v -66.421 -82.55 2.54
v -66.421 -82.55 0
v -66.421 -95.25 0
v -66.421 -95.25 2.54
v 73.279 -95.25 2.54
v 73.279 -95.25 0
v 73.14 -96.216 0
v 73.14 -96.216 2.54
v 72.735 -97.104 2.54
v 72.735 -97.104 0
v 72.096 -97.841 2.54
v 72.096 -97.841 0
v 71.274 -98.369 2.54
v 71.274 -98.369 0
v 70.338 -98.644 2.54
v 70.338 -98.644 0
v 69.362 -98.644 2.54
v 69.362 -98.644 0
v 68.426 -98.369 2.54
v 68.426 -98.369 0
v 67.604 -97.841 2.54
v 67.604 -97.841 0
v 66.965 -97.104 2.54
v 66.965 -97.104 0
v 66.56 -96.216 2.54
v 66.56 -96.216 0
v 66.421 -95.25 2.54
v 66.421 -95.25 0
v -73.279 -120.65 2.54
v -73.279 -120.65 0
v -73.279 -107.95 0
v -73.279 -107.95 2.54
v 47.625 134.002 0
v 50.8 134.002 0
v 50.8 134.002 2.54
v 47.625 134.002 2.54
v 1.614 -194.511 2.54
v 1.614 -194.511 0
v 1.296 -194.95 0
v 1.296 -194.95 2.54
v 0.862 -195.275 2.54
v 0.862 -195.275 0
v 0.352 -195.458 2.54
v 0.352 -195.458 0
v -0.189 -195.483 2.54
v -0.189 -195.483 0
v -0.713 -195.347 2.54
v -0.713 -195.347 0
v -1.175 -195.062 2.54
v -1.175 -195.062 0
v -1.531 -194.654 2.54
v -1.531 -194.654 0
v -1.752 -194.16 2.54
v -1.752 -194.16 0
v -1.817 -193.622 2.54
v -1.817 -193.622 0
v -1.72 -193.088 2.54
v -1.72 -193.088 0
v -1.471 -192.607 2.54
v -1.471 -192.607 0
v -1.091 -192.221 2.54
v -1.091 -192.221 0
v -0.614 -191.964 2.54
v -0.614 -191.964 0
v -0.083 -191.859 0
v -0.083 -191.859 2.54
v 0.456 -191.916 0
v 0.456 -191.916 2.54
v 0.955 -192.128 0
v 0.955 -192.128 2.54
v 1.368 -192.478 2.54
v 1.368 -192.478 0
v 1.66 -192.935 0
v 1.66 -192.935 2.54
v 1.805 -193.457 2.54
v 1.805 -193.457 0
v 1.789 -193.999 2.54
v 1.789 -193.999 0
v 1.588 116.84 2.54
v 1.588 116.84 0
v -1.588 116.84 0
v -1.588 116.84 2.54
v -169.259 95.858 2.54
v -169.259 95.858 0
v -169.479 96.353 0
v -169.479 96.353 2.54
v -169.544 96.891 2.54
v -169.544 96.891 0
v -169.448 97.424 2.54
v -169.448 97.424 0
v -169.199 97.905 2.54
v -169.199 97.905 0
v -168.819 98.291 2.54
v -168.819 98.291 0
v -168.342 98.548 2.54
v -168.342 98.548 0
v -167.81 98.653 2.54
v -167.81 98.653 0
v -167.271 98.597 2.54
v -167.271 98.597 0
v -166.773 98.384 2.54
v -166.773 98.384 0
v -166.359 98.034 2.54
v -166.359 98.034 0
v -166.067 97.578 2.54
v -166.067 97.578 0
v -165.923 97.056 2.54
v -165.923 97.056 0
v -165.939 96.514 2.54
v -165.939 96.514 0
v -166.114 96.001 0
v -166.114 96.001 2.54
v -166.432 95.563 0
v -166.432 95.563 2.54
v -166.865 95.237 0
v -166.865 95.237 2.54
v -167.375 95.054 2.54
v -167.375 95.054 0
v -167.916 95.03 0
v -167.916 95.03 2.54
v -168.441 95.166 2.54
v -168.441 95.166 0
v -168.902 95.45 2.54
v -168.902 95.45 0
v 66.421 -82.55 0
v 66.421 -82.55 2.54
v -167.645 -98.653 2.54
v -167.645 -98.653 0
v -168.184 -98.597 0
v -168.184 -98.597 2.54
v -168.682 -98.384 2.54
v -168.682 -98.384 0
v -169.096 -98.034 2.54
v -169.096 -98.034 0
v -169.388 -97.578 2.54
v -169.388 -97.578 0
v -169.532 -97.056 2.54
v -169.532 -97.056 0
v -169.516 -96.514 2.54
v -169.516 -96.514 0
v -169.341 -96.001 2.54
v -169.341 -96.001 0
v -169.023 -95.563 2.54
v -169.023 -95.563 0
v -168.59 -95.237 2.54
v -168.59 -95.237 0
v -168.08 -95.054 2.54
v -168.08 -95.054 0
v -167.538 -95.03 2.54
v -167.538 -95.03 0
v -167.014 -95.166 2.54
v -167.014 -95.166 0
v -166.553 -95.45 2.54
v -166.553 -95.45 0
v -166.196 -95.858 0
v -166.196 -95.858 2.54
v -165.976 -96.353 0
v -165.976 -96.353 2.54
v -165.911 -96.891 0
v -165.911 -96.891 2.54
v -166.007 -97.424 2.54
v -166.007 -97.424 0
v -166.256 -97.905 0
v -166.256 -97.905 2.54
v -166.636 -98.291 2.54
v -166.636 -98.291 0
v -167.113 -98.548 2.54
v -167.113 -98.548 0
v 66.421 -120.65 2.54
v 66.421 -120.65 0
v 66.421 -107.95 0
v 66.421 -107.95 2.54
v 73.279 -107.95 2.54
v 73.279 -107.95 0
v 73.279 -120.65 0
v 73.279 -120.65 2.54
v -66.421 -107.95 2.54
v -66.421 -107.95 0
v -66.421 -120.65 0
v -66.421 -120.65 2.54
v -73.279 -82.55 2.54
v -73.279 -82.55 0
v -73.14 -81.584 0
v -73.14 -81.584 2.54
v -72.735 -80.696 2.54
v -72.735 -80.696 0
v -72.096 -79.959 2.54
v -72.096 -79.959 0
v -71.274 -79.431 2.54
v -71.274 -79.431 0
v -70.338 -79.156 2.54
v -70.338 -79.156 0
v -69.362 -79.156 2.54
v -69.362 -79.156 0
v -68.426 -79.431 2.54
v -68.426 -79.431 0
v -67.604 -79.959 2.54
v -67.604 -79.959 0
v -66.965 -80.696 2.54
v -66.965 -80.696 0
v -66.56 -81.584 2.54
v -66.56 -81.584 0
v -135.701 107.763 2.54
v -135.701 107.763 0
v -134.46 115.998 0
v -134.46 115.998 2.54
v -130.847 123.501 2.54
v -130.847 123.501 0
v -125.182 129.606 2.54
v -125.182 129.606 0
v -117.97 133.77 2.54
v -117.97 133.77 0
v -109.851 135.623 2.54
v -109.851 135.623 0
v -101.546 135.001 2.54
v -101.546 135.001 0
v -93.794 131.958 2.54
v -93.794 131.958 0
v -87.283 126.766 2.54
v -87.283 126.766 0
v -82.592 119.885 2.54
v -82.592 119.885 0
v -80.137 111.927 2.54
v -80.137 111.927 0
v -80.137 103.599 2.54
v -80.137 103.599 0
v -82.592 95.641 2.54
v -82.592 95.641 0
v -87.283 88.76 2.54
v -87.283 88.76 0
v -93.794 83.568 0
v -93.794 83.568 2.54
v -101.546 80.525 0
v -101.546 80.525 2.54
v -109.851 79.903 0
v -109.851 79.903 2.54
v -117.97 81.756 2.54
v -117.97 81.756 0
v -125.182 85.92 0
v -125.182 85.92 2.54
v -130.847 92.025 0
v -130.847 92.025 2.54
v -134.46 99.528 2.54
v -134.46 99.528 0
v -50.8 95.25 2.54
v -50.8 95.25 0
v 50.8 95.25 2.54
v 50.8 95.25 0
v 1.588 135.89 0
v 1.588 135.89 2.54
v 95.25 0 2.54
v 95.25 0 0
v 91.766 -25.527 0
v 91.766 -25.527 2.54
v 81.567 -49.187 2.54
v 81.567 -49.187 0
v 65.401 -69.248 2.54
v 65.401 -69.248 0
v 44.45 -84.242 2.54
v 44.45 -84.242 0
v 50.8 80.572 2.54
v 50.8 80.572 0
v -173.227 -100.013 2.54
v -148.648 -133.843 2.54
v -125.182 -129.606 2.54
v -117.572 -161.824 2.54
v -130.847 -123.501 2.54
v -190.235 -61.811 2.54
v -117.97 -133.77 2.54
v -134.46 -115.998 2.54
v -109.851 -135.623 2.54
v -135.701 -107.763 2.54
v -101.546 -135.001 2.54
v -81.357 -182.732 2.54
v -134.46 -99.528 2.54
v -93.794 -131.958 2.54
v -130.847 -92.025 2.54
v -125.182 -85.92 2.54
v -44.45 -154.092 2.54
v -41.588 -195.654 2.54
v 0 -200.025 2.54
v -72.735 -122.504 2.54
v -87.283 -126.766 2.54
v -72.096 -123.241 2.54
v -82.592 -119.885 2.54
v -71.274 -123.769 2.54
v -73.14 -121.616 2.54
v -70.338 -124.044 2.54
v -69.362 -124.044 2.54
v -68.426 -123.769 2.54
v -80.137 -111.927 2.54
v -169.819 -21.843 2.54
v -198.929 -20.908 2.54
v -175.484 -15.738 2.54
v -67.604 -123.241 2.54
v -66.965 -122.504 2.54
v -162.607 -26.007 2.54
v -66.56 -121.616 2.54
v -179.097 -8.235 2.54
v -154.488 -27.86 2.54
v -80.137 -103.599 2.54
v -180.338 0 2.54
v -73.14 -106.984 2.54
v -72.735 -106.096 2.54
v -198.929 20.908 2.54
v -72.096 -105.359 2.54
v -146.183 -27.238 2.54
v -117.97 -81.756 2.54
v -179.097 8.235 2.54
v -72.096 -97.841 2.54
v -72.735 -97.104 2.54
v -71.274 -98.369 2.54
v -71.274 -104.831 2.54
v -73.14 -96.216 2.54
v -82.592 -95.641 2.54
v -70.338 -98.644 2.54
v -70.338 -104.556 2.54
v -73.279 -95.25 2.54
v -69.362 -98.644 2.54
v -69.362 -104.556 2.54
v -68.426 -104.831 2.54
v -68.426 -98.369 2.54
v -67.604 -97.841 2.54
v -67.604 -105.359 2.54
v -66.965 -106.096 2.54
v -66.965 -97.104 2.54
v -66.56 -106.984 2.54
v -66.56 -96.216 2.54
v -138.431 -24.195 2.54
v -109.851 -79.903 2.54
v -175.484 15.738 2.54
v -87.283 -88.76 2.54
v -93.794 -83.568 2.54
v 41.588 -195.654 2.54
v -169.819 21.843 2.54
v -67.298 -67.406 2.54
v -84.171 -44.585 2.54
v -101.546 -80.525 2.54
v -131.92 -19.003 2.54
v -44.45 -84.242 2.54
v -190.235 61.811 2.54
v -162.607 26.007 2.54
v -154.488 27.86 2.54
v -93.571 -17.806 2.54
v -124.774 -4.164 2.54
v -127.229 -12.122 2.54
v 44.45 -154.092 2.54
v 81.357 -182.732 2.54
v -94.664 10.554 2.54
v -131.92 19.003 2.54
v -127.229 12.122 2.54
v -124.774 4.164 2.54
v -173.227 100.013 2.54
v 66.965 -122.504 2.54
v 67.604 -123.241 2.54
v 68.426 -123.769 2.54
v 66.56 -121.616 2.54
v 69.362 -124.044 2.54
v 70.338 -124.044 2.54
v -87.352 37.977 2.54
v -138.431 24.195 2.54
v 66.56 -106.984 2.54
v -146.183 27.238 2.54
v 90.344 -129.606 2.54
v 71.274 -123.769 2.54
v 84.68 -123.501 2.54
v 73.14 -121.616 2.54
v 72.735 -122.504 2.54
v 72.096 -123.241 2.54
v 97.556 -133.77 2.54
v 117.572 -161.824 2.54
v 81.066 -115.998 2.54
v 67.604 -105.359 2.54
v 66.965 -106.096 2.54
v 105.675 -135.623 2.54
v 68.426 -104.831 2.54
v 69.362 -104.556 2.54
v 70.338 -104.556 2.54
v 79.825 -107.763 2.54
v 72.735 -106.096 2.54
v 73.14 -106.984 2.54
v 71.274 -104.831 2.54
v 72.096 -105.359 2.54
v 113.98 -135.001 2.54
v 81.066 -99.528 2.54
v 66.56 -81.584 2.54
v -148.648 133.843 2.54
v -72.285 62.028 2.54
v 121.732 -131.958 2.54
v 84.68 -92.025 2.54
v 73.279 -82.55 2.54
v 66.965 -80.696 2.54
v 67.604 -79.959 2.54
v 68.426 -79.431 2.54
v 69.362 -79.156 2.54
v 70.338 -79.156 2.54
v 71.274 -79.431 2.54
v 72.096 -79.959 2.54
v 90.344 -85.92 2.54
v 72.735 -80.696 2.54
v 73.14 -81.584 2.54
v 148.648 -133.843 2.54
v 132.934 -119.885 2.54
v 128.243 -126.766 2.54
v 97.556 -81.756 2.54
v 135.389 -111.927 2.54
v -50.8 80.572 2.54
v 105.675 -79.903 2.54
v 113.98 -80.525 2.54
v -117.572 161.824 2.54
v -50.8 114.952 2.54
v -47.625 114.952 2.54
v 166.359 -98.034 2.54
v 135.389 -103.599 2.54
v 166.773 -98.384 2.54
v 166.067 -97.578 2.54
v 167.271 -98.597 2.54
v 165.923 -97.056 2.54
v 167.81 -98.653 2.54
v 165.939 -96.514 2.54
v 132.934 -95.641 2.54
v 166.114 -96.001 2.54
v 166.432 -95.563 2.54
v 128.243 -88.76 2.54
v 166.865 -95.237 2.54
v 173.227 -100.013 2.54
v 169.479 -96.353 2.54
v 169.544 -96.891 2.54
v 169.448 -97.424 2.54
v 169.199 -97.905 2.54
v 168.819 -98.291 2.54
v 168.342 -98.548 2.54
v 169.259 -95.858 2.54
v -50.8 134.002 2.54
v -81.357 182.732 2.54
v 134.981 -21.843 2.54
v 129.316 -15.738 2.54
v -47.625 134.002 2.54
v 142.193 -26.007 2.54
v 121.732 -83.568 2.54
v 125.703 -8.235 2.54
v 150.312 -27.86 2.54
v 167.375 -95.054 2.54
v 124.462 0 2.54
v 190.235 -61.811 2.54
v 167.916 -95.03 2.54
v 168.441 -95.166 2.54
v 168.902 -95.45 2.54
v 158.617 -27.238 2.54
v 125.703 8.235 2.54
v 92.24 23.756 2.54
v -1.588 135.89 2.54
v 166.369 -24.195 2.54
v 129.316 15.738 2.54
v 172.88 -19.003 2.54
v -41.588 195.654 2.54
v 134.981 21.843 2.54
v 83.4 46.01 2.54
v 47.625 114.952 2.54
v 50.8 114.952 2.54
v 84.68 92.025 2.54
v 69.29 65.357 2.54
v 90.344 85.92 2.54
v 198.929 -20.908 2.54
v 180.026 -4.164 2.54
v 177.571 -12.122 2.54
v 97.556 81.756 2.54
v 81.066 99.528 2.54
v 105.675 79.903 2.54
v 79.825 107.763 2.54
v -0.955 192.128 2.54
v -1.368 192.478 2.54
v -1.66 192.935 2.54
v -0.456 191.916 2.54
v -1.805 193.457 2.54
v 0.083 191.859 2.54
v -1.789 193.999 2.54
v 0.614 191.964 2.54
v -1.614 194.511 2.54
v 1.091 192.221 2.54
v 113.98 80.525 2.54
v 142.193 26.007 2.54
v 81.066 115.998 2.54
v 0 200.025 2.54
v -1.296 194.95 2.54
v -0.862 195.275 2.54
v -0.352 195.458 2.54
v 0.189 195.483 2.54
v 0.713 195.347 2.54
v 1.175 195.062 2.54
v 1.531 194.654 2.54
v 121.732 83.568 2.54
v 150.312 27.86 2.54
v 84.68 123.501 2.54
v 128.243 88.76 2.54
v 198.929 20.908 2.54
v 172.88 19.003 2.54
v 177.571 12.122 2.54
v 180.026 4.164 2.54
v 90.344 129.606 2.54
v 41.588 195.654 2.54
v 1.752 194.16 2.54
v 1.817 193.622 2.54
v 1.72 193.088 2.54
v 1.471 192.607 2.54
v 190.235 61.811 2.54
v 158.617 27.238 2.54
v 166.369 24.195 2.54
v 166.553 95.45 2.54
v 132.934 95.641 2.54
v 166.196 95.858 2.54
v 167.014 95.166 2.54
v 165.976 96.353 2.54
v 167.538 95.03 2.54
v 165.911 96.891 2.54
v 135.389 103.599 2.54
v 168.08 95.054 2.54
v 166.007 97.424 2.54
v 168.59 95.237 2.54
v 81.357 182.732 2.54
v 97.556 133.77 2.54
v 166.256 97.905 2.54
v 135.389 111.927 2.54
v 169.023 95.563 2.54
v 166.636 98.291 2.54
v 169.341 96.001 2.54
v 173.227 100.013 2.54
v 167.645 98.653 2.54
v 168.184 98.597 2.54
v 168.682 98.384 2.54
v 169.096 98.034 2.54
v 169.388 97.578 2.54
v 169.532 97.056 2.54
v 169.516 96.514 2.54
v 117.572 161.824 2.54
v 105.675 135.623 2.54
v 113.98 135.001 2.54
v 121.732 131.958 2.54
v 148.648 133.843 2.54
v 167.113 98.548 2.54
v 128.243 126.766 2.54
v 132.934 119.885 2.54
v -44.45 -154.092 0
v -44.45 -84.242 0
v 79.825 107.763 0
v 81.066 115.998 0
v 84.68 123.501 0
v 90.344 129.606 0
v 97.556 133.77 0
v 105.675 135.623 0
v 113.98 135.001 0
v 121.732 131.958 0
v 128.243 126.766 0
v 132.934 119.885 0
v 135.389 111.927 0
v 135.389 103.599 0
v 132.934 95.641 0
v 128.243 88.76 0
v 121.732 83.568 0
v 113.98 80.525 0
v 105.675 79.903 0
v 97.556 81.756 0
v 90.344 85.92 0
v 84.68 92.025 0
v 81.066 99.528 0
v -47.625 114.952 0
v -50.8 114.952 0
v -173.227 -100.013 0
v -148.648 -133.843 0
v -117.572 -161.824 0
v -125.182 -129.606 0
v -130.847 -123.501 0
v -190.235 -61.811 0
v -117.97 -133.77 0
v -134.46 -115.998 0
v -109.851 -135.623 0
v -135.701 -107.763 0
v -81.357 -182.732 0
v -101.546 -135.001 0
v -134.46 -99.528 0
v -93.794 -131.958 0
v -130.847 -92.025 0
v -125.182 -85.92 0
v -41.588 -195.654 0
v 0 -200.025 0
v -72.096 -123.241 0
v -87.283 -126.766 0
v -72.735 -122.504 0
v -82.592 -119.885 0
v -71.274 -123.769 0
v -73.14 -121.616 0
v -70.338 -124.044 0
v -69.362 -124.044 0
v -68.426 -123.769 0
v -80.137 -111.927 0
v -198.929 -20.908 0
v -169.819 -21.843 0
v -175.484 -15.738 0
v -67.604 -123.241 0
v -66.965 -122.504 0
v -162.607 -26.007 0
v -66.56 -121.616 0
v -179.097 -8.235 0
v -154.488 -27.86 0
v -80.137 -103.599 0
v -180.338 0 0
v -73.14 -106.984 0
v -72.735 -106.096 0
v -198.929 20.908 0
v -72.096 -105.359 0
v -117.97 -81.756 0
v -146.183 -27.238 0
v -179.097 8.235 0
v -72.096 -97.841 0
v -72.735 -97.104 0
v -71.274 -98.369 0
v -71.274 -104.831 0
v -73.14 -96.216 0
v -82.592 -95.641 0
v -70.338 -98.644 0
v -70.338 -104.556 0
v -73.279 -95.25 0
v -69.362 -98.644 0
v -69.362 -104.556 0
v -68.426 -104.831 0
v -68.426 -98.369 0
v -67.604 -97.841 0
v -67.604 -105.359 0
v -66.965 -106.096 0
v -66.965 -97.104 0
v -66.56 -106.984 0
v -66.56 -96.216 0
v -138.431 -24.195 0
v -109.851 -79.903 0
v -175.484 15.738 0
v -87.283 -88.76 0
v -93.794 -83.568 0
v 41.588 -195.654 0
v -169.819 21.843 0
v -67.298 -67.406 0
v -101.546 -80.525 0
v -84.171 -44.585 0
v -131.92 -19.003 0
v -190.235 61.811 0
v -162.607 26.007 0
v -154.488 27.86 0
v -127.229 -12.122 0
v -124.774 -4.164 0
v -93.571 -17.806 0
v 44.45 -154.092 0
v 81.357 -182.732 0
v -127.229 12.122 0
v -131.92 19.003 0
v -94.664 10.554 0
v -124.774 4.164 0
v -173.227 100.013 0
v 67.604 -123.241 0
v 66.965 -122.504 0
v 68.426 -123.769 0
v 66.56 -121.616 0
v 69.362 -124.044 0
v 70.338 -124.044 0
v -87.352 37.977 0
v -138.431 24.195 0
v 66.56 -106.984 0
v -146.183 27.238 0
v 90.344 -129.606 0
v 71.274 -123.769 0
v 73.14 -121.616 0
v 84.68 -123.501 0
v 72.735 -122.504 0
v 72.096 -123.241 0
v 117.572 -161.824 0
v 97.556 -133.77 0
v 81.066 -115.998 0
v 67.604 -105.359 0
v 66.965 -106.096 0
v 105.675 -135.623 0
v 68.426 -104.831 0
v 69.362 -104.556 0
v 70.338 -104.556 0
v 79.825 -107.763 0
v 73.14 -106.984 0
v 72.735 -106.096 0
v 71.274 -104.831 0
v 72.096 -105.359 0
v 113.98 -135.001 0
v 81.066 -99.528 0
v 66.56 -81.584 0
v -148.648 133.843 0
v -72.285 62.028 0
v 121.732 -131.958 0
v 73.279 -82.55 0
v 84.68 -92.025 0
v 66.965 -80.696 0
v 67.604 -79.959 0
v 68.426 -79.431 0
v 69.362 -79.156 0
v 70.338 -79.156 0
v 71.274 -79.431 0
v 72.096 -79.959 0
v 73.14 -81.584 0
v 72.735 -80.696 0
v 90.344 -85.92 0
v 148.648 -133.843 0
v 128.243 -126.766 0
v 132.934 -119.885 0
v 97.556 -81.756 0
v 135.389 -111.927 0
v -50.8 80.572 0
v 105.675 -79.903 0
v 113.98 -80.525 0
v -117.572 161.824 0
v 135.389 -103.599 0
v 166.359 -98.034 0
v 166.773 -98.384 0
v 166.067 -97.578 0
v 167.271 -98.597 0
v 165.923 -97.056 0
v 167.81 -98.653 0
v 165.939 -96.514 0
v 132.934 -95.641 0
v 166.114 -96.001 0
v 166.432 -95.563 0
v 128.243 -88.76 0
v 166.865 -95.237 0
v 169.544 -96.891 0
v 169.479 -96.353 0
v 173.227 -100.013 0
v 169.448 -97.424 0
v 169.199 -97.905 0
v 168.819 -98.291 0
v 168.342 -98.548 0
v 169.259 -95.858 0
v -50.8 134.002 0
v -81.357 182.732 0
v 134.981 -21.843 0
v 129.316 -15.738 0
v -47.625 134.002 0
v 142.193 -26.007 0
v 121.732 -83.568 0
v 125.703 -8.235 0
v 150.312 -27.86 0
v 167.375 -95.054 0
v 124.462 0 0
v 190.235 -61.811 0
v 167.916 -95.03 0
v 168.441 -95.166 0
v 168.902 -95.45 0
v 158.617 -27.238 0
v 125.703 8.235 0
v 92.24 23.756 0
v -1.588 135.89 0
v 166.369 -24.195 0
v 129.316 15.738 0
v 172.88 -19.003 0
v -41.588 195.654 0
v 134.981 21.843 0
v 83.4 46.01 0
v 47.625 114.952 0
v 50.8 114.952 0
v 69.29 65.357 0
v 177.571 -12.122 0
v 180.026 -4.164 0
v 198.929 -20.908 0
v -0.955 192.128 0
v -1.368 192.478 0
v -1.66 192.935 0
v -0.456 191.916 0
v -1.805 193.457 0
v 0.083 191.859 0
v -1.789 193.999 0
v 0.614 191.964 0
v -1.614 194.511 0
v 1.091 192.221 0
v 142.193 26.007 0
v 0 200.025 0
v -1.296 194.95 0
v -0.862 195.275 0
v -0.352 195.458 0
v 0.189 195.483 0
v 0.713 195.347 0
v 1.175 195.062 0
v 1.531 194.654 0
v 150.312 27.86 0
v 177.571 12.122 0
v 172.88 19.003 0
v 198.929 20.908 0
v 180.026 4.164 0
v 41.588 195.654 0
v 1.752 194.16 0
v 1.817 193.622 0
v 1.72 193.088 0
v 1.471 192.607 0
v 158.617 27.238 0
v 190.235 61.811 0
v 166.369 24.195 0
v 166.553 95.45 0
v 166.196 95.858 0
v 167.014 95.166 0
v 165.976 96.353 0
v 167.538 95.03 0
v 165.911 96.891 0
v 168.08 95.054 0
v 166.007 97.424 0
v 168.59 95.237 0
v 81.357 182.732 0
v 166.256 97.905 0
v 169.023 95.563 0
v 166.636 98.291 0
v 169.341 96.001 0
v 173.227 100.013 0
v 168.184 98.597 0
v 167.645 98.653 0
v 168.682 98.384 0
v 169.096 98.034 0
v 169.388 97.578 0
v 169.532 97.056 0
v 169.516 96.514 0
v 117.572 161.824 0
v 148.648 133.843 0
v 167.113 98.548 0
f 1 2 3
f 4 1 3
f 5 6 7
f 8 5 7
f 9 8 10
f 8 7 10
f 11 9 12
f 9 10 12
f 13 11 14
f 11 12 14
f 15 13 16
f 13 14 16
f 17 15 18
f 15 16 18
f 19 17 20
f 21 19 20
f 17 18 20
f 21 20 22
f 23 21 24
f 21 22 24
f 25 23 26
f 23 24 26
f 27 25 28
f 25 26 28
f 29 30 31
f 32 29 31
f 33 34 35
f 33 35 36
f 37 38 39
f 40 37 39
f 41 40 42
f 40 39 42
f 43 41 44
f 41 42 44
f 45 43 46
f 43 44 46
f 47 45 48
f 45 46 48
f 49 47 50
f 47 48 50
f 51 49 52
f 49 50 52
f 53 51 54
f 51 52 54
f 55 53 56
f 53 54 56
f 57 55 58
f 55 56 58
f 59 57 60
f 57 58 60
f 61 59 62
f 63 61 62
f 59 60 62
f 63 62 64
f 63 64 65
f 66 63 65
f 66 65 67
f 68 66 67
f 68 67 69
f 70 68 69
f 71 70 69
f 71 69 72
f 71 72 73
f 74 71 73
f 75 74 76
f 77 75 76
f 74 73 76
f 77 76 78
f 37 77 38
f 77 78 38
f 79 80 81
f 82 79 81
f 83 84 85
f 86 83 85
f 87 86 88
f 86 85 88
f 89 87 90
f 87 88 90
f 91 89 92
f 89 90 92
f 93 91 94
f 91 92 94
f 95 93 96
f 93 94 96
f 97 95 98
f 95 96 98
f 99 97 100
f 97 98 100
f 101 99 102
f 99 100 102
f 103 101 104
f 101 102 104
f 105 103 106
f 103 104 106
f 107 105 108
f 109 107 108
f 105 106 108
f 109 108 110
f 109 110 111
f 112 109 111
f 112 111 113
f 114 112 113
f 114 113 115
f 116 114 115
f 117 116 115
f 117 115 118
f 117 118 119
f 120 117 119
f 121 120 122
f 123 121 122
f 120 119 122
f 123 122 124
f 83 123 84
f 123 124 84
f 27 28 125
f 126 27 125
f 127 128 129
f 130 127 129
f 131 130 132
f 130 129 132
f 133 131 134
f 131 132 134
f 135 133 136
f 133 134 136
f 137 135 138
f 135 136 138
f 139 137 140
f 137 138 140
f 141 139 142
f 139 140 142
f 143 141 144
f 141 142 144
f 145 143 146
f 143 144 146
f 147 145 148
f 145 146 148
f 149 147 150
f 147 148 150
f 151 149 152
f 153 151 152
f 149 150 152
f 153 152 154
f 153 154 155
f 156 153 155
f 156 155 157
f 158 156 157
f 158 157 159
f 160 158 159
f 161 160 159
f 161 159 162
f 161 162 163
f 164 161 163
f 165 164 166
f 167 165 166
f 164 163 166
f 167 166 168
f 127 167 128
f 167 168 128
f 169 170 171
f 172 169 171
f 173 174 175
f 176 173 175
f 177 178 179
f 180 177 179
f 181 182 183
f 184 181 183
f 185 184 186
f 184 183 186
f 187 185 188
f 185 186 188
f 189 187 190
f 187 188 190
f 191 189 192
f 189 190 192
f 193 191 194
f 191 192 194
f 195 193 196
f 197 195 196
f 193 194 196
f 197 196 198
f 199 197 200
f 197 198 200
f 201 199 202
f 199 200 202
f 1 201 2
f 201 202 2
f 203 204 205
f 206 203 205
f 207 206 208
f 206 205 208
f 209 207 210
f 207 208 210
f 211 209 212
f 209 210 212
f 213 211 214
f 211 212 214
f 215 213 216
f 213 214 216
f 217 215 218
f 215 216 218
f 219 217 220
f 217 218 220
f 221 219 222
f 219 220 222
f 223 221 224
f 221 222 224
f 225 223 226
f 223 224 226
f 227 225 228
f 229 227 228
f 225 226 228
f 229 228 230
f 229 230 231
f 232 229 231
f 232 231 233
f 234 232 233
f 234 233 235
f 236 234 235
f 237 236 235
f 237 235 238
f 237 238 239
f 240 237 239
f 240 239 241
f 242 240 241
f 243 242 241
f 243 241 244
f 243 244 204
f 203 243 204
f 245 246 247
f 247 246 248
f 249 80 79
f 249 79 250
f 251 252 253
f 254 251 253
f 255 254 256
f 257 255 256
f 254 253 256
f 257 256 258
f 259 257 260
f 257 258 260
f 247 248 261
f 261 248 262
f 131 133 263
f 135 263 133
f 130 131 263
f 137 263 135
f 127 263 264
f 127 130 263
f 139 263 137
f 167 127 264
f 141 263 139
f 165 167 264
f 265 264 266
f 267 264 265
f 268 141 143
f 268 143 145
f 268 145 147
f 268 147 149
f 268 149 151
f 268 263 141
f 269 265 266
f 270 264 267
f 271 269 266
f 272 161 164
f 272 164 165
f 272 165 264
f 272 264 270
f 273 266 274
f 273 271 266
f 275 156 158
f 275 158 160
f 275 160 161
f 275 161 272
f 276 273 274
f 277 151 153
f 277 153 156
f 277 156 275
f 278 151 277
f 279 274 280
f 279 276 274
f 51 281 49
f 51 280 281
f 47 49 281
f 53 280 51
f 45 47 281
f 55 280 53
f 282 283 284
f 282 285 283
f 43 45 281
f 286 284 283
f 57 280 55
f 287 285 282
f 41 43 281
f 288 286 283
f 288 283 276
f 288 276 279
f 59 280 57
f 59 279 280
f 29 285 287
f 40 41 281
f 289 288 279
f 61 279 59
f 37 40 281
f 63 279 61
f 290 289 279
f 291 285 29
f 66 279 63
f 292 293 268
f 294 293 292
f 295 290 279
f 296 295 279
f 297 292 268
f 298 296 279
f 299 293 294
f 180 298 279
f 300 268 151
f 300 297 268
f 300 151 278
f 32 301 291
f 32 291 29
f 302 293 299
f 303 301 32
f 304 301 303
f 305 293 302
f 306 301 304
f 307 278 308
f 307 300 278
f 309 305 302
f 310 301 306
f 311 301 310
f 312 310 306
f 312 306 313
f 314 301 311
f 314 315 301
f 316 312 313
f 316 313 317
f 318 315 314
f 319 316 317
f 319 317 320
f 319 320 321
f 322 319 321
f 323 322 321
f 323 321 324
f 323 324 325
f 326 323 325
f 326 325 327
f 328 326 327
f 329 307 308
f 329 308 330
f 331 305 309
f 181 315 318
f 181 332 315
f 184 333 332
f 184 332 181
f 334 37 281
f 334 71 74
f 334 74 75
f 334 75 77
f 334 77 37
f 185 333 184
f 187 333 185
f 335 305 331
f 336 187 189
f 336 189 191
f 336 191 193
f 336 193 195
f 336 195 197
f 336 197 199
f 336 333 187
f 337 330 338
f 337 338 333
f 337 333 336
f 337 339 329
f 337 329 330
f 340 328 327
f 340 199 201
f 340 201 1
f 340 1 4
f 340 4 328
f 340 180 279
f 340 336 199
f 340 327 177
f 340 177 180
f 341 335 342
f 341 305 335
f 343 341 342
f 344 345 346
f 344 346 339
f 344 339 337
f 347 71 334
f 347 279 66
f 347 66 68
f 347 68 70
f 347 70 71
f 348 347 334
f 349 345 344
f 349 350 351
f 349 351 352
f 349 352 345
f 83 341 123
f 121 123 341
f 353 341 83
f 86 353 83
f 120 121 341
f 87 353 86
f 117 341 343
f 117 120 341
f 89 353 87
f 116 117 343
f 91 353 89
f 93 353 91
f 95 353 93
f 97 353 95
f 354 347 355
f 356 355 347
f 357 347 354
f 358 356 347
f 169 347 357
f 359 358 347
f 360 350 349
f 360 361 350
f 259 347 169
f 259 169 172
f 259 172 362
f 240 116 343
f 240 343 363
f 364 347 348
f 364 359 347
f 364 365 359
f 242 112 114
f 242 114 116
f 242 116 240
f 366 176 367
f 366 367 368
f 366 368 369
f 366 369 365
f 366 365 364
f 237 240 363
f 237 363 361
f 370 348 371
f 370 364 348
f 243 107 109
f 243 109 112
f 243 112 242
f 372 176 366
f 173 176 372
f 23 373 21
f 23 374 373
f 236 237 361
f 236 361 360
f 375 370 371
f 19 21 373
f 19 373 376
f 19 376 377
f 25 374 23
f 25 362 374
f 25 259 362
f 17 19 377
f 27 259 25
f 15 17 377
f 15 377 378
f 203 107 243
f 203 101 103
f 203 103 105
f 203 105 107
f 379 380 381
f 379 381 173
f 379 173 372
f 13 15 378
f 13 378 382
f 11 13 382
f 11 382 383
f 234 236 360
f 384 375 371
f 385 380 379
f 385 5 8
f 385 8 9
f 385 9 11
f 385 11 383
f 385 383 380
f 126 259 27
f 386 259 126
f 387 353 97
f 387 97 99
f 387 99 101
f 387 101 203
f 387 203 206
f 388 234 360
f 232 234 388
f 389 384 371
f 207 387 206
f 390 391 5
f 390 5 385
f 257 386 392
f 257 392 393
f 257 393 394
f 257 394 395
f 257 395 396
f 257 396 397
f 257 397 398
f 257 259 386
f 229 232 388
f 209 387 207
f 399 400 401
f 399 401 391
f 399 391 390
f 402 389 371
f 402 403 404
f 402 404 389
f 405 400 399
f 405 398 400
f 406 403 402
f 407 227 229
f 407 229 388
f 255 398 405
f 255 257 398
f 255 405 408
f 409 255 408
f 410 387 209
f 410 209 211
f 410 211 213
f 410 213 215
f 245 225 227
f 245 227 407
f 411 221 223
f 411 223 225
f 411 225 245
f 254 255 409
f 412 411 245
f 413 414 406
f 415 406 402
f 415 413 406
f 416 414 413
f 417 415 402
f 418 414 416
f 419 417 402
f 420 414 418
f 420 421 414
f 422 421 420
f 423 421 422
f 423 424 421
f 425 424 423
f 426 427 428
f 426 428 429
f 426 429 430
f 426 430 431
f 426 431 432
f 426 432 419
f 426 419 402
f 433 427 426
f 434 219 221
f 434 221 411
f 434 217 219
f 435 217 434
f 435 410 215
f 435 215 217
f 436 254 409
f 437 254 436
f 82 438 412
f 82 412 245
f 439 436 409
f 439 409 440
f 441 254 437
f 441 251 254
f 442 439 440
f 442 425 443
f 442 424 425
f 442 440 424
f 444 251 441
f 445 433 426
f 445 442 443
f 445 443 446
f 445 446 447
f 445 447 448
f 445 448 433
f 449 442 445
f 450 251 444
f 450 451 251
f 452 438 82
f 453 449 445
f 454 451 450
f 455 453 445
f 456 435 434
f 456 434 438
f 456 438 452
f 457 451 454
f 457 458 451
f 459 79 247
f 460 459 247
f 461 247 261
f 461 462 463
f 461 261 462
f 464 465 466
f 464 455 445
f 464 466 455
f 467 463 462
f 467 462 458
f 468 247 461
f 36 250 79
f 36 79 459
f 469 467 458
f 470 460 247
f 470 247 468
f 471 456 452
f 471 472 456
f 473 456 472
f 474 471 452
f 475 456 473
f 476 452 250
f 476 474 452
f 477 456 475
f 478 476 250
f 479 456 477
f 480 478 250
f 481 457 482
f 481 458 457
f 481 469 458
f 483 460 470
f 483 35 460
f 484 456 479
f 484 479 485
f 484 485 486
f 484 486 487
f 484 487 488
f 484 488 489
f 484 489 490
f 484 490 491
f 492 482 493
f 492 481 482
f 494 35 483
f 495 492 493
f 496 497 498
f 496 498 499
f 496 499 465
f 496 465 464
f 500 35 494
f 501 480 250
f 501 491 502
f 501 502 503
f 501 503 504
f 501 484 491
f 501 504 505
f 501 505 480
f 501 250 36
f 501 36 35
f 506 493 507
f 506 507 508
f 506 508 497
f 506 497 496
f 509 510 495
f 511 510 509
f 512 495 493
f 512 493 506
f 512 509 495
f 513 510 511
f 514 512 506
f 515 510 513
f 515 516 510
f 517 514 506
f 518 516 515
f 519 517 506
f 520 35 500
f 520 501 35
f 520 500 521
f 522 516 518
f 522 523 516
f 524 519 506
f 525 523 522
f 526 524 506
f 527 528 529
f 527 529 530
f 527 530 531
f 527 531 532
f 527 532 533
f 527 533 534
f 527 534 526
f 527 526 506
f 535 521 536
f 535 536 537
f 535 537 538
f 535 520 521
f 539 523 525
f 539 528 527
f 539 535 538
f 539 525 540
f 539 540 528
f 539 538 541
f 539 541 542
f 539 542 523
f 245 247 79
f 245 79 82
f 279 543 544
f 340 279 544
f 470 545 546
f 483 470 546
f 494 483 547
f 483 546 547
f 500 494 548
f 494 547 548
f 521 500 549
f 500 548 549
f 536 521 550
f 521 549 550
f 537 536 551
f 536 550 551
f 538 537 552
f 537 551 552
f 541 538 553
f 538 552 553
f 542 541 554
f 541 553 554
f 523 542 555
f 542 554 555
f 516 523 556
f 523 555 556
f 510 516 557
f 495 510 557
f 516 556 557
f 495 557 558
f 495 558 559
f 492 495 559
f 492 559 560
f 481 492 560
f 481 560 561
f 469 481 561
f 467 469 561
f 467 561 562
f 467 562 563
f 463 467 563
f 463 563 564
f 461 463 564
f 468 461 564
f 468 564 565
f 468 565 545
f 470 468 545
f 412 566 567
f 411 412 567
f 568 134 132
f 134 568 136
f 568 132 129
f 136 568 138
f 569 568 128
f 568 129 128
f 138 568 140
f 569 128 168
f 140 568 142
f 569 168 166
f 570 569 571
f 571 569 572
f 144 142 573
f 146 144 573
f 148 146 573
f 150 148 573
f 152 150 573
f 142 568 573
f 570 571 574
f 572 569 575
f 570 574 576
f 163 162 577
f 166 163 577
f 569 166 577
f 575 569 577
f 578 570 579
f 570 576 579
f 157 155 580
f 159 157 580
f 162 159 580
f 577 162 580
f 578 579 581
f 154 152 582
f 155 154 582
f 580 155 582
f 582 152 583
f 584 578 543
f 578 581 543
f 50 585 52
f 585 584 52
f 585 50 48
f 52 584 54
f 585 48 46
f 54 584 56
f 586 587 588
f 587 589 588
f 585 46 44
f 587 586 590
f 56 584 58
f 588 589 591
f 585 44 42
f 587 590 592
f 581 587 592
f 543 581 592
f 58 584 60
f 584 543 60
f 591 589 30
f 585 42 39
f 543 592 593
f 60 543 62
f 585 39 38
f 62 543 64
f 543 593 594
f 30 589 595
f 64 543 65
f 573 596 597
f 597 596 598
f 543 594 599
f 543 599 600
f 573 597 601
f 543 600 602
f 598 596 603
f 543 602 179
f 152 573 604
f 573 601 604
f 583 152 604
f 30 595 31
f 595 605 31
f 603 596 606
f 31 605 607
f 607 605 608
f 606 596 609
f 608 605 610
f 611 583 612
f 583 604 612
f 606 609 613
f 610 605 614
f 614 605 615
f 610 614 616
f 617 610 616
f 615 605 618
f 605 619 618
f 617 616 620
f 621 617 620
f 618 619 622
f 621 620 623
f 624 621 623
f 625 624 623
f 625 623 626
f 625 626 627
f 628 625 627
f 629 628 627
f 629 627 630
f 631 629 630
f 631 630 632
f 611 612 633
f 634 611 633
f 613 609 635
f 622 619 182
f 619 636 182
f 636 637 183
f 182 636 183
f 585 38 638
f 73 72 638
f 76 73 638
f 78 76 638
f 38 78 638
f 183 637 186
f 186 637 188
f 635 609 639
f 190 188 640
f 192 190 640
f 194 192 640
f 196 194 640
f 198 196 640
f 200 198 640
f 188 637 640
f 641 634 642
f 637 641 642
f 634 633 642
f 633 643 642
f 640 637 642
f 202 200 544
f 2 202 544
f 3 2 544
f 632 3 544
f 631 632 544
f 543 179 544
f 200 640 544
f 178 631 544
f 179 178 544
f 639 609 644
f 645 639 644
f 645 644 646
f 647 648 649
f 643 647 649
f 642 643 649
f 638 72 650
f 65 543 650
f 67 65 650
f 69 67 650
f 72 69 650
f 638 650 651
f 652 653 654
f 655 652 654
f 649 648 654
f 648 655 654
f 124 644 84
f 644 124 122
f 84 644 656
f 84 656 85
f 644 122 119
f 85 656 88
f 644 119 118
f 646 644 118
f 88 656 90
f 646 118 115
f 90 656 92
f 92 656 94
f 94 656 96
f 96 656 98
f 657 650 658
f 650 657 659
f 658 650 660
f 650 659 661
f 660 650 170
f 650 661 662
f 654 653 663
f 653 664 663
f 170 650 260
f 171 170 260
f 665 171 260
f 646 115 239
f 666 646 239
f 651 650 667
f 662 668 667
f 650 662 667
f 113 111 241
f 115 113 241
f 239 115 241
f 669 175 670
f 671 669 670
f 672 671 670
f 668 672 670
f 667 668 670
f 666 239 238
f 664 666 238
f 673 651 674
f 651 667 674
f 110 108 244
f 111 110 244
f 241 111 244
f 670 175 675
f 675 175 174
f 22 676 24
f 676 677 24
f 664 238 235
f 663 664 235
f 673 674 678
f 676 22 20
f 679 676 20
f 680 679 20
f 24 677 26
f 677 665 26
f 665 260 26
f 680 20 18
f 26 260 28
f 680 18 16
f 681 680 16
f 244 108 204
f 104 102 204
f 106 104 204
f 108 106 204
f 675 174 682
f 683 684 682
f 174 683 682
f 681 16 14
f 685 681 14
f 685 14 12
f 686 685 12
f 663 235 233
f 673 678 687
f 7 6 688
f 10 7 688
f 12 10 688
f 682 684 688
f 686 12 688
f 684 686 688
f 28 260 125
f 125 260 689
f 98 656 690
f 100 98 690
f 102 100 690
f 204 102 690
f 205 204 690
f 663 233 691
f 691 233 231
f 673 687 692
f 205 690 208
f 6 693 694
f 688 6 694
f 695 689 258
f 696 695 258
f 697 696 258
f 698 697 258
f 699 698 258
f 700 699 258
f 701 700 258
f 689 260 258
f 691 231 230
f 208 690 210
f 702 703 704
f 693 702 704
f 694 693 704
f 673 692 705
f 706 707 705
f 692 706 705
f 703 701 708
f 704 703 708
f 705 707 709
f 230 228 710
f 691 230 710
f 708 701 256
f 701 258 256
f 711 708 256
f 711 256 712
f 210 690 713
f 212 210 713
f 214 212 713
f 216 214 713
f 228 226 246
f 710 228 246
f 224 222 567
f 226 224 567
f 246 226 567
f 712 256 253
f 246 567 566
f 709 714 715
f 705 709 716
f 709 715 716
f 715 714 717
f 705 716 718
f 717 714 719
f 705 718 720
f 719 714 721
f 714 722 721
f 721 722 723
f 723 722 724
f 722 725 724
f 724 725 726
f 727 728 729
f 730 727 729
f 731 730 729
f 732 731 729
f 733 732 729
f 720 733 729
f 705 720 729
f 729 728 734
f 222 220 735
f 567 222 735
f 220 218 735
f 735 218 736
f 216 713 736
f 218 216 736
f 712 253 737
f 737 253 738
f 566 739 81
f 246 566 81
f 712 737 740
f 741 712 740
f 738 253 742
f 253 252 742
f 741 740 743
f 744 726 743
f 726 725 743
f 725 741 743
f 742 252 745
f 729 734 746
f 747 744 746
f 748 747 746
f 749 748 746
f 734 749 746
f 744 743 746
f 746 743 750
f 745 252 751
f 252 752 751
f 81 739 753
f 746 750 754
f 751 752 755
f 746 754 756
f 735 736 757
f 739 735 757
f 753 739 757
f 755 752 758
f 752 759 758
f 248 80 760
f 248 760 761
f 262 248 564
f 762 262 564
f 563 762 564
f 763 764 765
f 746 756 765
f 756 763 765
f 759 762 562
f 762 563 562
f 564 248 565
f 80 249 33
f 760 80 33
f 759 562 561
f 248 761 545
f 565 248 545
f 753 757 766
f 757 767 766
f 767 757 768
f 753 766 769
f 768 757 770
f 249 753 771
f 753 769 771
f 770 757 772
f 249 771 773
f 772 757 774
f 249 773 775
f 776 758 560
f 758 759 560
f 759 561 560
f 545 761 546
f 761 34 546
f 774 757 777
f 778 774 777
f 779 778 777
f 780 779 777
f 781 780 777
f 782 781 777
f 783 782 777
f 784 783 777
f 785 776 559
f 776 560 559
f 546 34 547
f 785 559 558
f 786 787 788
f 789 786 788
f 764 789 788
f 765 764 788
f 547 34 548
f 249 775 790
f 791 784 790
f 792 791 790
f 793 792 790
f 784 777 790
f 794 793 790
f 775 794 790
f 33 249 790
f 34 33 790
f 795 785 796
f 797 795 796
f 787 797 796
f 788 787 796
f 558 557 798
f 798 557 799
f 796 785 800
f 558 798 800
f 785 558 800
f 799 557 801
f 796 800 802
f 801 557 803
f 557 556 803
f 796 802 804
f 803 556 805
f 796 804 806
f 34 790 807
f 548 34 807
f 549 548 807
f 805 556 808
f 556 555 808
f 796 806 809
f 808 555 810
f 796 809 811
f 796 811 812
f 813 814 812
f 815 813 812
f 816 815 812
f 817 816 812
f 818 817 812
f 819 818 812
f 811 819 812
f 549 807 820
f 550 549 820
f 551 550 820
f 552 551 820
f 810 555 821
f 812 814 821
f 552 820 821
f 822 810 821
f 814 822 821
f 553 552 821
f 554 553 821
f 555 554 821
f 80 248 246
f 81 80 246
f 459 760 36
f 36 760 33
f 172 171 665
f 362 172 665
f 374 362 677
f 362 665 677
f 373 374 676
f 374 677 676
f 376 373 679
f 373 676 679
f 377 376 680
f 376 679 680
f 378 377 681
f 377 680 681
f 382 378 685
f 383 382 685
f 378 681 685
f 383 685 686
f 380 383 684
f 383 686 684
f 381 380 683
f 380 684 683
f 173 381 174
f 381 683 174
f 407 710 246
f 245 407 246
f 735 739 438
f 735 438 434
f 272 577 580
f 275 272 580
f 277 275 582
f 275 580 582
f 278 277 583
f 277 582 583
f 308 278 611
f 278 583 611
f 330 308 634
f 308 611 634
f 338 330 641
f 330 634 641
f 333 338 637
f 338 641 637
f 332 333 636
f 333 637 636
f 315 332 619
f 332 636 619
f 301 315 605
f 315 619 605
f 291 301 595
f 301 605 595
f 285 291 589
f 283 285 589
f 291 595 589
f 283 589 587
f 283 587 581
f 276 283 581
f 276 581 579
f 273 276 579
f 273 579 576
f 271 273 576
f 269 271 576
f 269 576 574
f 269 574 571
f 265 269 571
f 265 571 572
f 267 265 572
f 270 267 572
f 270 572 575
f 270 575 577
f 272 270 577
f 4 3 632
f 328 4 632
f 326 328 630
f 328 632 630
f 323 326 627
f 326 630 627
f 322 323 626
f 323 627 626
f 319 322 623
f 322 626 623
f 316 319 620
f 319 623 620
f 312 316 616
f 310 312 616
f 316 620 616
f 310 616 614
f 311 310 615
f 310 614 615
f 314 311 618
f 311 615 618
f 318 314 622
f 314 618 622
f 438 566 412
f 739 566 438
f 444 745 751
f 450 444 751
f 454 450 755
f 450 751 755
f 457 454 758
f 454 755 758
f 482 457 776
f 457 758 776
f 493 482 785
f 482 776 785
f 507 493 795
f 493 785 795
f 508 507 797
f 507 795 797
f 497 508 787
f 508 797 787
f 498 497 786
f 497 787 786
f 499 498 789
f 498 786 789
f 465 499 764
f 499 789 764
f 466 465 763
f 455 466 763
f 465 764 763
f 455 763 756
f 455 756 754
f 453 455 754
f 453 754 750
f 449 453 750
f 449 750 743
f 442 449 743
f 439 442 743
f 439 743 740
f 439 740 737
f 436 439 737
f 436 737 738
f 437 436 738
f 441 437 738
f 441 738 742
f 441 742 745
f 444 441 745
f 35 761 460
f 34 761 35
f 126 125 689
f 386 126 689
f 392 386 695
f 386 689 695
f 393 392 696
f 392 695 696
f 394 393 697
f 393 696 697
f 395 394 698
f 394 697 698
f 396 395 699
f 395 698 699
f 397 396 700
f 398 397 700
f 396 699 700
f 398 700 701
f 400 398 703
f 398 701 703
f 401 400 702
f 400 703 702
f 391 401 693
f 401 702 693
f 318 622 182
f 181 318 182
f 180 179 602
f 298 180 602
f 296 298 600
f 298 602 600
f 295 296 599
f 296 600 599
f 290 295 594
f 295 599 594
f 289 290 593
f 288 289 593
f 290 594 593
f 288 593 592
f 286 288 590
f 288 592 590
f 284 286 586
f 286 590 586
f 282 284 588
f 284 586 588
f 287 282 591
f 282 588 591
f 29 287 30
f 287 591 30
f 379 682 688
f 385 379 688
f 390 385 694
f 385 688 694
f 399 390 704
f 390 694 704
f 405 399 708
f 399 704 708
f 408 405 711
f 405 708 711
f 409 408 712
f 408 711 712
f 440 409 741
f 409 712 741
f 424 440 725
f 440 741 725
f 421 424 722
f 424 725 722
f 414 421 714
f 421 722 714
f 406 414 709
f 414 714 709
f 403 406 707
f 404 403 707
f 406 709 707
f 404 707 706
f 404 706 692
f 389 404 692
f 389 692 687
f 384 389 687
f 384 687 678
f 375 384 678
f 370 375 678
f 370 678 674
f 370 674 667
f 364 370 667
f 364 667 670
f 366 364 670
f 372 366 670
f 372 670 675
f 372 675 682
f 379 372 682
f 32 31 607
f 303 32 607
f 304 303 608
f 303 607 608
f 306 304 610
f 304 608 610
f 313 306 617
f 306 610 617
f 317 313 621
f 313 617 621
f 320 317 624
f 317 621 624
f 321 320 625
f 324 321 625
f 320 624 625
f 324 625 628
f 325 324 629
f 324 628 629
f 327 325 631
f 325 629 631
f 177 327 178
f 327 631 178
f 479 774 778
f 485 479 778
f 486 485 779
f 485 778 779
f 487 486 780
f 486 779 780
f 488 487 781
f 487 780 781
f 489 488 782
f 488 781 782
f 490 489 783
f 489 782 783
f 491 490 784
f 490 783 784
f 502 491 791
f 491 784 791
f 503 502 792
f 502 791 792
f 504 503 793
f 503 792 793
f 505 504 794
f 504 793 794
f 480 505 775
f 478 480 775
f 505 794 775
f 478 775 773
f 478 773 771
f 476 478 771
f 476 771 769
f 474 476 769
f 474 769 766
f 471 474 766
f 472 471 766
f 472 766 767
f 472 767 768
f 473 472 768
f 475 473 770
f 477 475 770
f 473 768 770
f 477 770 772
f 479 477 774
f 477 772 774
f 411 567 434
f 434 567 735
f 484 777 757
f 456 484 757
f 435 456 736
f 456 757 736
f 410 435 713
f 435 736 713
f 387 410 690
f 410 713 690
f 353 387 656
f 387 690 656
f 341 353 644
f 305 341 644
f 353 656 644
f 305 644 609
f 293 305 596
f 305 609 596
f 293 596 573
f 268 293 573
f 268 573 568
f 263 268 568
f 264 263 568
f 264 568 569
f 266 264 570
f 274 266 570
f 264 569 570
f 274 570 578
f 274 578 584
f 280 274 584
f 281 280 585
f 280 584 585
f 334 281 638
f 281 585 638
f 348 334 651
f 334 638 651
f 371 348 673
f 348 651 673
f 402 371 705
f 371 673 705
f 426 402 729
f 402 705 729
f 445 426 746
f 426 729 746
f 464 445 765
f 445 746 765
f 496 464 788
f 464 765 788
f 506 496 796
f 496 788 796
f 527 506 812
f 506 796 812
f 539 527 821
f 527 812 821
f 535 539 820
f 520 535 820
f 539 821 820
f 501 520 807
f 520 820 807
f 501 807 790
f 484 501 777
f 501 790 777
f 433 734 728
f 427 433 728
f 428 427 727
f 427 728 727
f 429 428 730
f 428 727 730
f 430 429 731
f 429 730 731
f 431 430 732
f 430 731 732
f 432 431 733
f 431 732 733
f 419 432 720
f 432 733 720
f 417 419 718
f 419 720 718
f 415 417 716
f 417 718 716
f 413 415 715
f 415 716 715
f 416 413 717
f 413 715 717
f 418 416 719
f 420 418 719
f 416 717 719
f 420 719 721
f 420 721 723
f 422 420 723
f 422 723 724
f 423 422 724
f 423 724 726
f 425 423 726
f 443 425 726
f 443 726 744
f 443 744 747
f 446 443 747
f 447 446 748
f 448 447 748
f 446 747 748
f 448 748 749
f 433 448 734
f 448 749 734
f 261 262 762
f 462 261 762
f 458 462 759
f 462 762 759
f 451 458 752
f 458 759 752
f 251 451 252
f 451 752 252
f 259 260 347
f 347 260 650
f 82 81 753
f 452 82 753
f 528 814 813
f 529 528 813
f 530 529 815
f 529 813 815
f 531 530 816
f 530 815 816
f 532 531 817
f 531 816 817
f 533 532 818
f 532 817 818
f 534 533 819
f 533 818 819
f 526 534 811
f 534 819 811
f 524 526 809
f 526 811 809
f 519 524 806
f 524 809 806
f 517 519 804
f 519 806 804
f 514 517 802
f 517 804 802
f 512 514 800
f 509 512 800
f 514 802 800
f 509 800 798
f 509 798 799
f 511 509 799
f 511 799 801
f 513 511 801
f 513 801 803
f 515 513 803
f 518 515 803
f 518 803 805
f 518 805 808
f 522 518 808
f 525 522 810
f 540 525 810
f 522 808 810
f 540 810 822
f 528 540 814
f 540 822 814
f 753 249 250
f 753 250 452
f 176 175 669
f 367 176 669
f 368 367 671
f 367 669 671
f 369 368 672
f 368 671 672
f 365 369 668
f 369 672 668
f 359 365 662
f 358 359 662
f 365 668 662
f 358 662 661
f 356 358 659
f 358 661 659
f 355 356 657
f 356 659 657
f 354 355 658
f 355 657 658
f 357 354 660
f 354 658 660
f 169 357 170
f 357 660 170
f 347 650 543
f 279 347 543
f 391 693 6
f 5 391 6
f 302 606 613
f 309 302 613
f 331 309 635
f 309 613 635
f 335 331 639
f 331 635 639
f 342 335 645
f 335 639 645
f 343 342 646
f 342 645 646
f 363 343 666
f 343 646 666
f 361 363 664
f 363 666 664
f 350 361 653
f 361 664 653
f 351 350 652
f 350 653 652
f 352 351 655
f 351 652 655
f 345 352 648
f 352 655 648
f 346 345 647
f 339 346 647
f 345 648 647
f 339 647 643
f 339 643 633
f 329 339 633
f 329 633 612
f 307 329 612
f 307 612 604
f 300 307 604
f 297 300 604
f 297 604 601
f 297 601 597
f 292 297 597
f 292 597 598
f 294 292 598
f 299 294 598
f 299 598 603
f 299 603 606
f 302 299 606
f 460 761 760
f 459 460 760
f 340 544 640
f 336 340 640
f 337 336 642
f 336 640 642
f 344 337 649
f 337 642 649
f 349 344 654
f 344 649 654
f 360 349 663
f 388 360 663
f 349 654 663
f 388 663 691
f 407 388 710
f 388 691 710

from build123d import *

# Parameters (mm, degrees)
BOSS_EXTRUDE1_DEPTH = 2.54
SKETCH5_W           = 3.175
SKETCH5_H           = 19.05
CUT_EXTRUDE1_DEPTH  = 3.175
SKETCH6_R           = 27.938087672
CUT_EXTRUDE2_DEPTH  = 3.175


with BuildPart() as part:
    # Sketch2 → Boss-Extrude1 (new body)
    with BuildSketch(Plane.XY):
        with BuildLine():
            ThreePointArc((0, -200.025), (200.025, 0), (0, 200.025))
            ThreePointArc((0, 200.025), (-200.025, 0), (0, -200.025))
        make_face()
        with BuildLine():
            ThreePointArc((-73.279, -107.95), (-69.85, -104.521), (-66.421, -107.95))
            Line((-66.421, -107.95), (-66.421, -120.65))
            ThreePointArc((-66.421, -120.65), (-69.85, -124.079), (-73.279, -120.65))
            Line((-73.279, -120.65), (-73.279, -107.95))
        make_face(mode=Mode.SUBTRACT)
        with BuildLine():
            ThreePointArc((-167.810051257, -95.021689383), (-165.911659461, -96.754918821), (-167.644888899, -98.653310617))
            ThreePointArc((-167.644888899, -98.653310617), (-169.543280695, -96.920081179), (-167.810051257, -95.021689383))
        make_face(mode=Mode.SUBTRACT)
        with BuildLine():
            ThreePointArc((-73.279, -82.55), (-69.85, -79.121), (-66.421, -82.55))
            Line((-66.421, -82.55), (-66.421, -95.25))
            ThreePointArc((-66.421, -95.25), (-69.85, -98.679), (-73.279, -95.25))
            Line((-73.279, -95.25), (-73.279, -82.55))
        make_face(mode=Mode.SUBTRACT)
        with BuildLine():
            ThreePointArc((-1.613828712, -192.83861209), (0.83638791, -192.061171288), (1.613828712, -194.51138791))
            ThreePointArc((1.613828712, -194.51138791), (-0.83638791, -195.288828712), (-1.613828712, -192.83861209))
        make_face(mode=Mode.SUBTRACT)
        with BuildLine():
            ThreePointArc((66.421, -107.95), (69.85, -104.521), (73.279, -107.95))
            Line((73.279, -107.95), (73.279, -120.65))
            ThreePointArc((73.279, -120.65), (69.85, -124.079), (66.421, -120.65))
            Line((66.421, -120.65), (66.421, -107.95))
        make_face(mode=Mode.SUBTRACT)
        with BuildLine():
            ThreePointArc((66.421, -82.55), (69.85, -79.121), (73.279, -82.55))
            Line((73.279, -82.55), (73.279, -95.25))
            ThreePointArc((73.279, -95.25), (69.85, -98.679), (66.421, -95.25))
            Line((66.421, -95.25), (66.421, -82.55))
        make_face(mode=Mode.SUBTRACT)
        with BuildLine():
            Line((-44.45, -154.092269675), (-44.45, -84.242269675))
            ThreePointArc((-44.45, -84.242269675), (-95.179383339, -3.667081567), (-50.8, 80.572467382))
            Line((-50.8, 80.572467382), (-50.8, 95.25))
            Line((-50.8, 95.25), (2.71e-07, 95.25))
            Line((2.71e-07, 95.25), (50.8, 95.25))
            Line((50.8, 95.25), (50.8, 80.572467382))
            ThreePointArc((50.8, 80.572467382), (83.400427157, 46.010121169), (95.25, 0))
            ThreePointArc((95.25, 0), (81.567226875, -49.186888497), (44.45, -84.242269675))
            Line((44.45, -84.242269675), (44.45, -154.092269675))
            Line((44.45, -154.092269675), (-44.45, -154.092269675))
        make_face(mode=Mode.SUBTRACT)
        with BuildLine():
            ThreePointArc((166.196222545, -97.816922707), (166.748047371, -95.306252467), (169.258717611, -95.858077293))
            ThreePointArc((169.258717611, -95.858077293), (168.706892785, -98.368747533), (166.196222545, -97.816922707))
        make_face(mode=Mode.SUBTRACT)
        with BuildLine():
            ThreePointArc((-166.196222545, 97.816922707), (-166.748047371, 95.306252467), (-169.258717611, 95.858077293))
            ThreePointArc((-169.258717611, 95.858077293), (-168.706892785, 98.368747533), (-166.196222545, 97.816922707))
        make_face(mode=Mode.SUBTRACT)
        with BuildLine():
            ThreePointArc((1.613828712, 192.83861209), (-0.83638791, 192.061171288), (-1.613828712, 194.51138791))
            ThreePointArc((-1.613828712, 194.51138791), (0.83638791, 195.288828712), (1.613828712, 192.83861209))
        make_face(mode=Mode.SUBTRACT)
        with BuildLine():
            ThreePointArc((167.810051257, 95.021689383), (165.911659461, 96.754918821), (167.644888899, 98.653310617))
            ThreePointArc((167.644888899, 98.653310617), (169.543280695, 96.920081179), (167.810051257, 95.021689383))
        make_face(mode=Mode.SUBTRACT)
    extrude(amount=BOSS_EXTRUDE1_DEPTH)

    # Sketch5 → Cut-Extrude1 (cut)
    with BuildSketch(Plane(origin=(0, 0, 0), x_dir=(-1, 0, 0), z_dir=(0, 0, -1))):
        with Locations((49.2125, 124.476608207)):
            Rectangle(SKETCH5_W, SKETCH5_H)
        with Locations((0, 126.364925979)):
            Rectangle(SKETCH5_W, SKETCH5_H)
        with Locations((-49.2125, 124.476608207)):
            Rectangle(SKETCH5_W, SKETCH5_H)
    extrude(amount=-CUT_EXTRUDE1_DEPTH, mode=Mode.SUBTRACT)

    # Sketch6 → Cut-Extrude2 (cut)
    with BuildSketch(Plane(origin=(0, 0, 0), x_dir=(-1, 0, 0), z_dir=(0, 0, -1))):
        with Locations((-152.4, 0)):
            Circle(SKETCH6_R)
        with Locations((-107.763073453, 107.763073453)):
            Circle(SKETCH6_R)
        with Locations((107.763073453, 107.763073453)):
            Circle(SKETCH6_R)
        with Locations((152.4, 0)):
            Circle(SKETCH6_R)
        with Locations((107.763073453, -107.763073453)):
            Circle(SKETCH6_R)
        with Locations((-107.763073453, -107.763073453)):
            Circle(SKETCH6_R)
    extrude(amount=-CUT_EXTRUDE2_DEPTH, mode=Mode.SUBTRACT)


solid = part.part
